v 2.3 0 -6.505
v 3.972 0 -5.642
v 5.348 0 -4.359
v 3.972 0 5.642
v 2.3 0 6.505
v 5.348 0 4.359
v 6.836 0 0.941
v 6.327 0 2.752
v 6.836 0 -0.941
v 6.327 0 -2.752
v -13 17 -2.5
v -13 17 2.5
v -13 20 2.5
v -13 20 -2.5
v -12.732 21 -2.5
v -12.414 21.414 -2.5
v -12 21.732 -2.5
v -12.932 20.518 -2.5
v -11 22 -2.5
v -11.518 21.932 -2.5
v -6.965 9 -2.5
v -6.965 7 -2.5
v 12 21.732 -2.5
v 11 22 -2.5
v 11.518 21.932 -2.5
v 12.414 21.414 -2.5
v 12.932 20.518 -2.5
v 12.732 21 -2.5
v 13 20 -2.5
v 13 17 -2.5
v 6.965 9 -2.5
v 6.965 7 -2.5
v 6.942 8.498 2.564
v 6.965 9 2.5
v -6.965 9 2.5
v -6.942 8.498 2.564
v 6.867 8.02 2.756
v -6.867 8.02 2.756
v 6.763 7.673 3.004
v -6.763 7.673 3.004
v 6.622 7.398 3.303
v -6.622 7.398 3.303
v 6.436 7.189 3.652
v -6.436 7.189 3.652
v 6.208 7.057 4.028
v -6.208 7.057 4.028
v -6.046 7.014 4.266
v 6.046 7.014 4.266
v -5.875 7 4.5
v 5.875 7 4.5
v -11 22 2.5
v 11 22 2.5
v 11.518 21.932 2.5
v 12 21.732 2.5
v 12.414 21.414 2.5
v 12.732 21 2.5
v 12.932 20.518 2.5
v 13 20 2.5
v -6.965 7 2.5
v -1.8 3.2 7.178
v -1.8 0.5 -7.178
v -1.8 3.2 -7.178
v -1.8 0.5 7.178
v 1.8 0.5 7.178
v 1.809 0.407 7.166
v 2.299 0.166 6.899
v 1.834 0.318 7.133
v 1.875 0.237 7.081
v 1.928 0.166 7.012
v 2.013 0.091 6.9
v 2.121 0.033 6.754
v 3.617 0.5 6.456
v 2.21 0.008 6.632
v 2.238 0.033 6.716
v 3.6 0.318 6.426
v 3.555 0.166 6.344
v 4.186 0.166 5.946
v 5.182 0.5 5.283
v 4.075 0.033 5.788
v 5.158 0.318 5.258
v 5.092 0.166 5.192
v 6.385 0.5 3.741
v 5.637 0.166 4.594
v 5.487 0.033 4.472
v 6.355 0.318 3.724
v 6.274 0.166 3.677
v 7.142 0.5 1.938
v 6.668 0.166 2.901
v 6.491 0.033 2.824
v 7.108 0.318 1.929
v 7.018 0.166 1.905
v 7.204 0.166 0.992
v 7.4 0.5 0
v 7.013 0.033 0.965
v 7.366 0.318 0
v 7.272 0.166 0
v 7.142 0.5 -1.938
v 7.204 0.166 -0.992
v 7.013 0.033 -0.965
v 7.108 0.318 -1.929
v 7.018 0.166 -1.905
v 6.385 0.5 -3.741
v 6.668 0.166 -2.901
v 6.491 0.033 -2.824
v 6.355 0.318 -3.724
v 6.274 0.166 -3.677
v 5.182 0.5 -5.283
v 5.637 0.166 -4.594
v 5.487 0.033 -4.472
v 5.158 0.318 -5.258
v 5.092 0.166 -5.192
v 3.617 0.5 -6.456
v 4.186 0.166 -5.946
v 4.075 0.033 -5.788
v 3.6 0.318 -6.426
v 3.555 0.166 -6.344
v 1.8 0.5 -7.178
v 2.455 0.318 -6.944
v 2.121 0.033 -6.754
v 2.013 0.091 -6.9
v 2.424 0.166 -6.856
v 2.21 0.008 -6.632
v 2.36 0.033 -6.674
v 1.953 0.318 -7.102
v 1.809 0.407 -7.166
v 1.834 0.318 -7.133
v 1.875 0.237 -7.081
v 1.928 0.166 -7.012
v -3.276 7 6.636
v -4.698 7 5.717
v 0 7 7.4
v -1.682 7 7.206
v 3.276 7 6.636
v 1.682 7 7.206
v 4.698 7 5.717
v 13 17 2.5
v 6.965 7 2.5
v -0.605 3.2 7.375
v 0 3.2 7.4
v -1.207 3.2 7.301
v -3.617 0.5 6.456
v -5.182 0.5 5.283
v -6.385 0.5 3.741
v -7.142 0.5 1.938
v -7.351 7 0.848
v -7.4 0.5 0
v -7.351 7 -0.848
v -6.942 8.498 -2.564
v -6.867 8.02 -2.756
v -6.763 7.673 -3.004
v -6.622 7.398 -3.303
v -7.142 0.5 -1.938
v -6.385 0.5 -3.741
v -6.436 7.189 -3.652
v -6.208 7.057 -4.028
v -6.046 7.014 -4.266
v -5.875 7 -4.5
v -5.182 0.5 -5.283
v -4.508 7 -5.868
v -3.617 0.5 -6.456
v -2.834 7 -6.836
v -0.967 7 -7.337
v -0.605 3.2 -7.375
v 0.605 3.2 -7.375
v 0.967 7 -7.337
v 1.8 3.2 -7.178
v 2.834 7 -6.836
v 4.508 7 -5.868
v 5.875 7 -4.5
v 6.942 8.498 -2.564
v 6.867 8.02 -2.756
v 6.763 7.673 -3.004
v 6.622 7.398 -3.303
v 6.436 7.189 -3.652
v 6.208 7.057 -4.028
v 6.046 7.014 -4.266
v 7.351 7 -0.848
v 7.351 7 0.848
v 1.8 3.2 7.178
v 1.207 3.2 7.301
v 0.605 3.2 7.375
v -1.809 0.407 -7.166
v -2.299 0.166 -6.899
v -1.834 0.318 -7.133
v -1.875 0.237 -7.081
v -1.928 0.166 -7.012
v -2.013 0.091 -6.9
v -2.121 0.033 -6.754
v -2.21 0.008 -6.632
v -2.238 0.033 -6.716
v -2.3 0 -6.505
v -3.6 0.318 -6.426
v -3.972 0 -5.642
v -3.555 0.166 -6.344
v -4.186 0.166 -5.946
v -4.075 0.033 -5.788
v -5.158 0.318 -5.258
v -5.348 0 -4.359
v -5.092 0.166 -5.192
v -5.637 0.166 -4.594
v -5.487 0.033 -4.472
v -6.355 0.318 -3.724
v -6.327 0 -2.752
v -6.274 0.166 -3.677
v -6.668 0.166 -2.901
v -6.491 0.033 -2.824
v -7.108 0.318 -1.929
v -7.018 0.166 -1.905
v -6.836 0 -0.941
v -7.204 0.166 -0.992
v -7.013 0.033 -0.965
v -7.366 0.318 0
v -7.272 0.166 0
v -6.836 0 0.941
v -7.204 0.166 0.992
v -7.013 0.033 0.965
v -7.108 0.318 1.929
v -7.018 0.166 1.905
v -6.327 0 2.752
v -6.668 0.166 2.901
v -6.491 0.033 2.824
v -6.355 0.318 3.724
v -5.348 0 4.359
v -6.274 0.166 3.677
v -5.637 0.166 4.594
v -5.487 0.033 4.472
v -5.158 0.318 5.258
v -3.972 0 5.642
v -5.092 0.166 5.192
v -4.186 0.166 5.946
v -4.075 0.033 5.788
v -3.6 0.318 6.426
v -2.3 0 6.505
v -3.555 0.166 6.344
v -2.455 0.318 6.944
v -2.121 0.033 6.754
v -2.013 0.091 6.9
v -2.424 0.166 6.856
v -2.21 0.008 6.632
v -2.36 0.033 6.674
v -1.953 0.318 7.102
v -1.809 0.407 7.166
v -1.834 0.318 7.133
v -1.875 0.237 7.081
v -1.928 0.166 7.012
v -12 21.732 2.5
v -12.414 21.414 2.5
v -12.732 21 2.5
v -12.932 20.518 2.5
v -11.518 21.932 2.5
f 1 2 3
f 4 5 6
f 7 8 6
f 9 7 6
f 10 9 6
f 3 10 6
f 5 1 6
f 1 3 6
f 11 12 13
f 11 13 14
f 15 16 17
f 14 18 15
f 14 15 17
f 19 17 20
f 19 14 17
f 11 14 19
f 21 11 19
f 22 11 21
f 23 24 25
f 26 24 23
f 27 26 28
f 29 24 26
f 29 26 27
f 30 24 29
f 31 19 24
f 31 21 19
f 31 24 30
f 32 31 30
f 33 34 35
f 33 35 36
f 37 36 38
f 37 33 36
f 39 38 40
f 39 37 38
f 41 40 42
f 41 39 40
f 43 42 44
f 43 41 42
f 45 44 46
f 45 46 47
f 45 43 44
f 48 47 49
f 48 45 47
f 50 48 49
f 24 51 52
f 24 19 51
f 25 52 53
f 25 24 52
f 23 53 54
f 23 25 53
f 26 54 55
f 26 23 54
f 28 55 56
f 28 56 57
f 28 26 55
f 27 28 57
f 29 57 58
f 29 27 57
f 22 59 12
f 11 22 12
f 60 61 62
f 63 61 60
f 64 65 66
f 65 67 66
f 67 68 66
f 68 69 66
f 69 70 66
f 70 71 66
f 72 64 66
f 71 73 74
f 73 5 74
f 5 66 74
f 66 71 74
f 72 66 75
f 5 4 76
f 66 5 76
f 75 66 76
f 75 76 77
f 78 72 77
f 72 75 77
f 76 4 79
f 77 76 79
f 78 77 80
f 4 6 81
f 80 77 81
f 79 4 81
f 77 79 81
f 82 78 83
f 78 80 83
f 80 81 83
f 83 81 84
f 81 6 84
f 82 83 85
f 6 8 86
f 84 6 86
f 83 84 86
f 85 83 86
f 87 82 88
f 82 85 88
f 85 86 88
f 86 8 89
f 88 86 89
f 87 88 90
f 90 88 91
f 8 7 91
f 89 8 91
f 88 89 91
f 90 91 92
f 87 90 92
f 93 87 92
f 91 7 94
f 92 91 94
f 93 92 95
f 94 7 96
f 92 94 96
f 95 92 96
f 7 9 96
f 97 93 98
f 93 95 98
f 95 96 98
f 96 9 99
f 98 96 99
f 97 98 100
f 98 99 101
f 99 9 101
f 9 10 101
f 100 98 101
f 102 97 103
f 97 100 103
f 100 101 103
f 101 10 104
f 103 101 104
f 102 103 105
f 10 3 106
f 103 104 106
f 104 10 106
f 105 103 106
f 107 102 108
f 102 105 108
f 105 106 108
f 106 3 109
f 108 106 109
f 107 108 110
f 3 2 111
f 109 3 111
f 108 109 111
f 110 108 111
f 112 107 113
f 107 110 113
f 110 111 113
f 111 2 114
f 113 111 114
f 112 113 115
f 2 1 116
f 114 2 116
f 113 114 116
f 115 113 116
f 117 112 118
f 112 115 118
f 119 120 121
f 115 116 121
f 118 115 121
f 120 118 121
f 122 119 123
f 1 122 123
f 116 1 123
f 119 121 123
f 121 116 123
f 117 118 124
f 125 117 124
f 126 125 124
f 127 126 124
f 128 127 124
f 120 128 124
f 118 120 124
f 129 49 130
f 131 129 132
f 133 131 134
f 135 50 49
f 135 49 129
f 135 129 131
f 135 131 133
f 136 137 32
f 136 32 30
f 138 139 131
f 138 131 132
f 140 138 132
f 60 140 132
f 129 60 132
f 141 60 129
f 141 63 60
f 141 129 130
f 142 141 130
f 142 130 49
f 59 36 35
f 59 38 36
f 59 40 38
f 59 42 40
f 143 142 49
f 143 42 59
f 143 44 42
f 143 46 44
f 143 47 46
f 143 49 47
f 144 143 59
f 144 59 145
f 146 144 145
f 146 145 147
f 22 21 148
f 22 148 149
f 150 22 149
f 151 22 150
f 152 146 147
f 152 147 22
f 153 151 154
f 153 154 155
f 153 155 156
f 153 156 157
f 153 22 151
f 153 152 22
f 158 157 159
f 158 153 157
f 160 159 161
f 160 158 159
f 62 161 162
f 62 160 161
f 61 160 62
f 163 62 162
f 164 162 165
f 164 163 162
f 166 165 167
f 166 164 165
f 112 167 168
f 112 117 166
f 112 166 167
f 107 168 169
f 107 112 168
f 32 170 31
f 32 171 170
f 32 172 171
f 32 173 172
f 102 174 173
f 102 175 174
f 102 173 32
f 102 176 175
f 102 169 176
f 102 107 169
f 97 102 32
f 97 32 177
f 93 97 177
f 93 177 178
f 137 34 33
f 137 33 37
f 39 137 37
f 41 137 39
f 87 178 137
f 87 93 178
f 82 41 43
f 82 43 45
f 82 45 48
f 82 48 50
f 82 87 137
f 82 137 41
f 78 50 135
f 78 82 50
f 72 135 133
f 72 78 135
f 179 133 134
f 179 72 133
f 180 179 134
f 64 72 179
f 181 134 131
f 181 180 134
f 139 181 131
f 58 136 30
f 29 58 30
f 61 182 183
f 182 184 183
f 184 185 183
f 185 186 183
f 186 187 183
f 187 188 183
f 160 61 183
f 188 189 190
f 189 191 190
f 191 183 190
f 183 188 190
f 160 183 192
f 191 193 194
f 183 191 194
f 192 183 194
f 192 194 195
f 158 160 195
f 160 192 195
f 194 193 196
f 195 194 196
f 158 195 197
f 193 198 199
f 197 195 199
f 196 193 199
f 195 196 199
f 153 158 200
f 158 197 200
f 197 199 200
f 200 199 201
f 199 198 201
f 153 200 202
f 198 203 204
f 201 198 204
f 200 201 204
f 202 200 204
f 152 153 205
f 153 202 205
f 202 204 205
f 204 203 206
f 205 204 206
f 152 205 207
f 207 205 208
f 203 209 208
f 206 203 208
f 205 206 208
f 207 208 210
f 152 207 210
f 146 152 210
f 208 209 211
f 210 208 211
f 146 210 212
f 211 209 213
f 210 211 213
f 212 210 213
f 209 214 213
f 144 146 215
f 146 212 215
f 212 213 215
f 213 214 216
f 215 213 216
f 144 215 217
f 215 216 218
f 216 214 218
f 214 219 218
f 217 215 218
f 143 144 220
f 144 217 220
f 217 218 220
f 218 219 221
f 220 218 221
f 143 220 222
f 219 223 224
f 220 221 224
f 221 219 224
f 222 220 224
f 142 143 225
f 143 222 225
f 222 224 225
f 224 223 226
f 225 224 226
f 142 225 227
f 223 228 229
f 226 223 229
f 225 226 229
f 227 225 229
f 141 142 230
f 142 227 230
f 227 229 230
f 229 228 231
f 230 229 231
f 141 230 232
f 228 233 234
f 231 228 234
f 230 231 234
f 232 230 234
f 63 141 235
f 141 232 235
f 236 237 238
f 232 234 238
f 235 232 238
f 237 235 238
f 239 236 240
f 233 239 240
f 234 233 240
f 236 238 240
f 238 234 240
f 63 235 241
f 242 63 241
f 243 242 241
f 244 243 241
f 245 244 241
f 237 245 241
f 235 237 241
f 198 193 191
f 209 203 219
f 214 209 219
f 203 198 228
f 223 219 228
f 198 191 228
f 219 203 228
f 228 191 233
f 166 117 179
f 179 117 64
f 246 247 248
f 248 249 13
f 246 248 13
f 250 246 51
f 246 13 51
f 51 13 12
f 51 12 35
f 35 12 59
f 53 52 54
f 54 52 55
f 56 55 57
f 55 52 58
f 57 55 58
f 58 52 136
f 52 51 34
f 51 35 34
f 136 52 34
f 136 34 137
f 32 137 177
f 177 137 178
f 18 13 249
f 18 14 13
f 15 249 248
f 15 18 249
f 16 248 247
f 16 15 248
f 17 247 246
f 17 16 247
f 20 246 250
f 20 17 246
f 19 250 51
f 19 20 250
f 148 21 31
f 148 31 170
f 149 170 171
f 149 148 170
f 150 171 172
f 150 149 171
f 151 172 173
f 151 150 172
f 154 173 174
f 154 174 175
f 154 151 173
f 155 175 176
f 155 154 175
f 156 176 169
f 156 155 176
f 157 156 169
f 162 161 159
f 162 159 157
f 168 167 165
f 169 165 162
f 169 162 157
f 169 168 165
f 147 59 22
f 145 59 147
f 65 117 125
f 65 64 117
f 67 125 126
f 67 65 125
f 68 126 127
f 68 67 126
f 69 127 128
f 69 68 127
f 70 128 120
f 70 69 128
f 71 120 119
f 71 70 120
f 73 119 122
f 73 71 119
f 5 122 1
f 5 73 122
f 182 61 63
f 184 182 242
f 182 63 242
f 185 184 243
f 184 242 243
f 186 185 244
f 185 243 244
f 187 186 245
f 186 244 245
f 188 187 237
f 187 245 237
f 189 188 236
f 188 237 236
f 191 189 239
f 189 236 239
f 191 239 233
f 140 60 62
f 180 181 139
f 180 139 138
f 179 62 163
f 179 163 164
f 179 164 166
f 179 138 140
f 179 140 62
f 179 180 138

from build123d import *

# Parameters (mm, degrees)
SKETCH1_R           = 7.4
BOSS_EXTRUDE1_DEPTH = 7
SKETCH2_W           = 3.6
SKETCH2_H           = 16.327847923
CUT_EXTRUDE1_DEPTH  = 3.2
FILLET1_R           = 0.5
SKETCH3_W           = 26
SKETCH3_H           = 5
BOSS_EXTRUDE2_DEPTH = 15
CUT_EXTRUDE2_DEPTH  = 28.404561664
FILLET2_R           = 2
FILLET3_R           = 2


with BuildPart() as part:
    # Sketch1 → Boss-Extrude1 (new body)
    with BuildSketch(Plane(origin=(0, 0, 0), x_dir=(1, 0, 0), z_dir=(0, 1, 0))):
        with Locations(Location((0, 0, 0), (0, 0, 270))):
            Circle(SKETCH1_R)
    extrude(amount=BOSS_EXTRUDE1_DEPTH)

    # Sketch2 → Cut-Extrude1 (cut)
    with BuildSketch(Plane.XZ):
        with Locations((0, -0.126477582)):
            Rectangle(SKETCH2_W, SKETCH2_H)
    extrude(amount=-CUT_EXTRUDE1_DEPTH, mode=Mode.SUBTRACT)

    # Fillet1
    fillet1_edges = [part.edges().sort_by_distance(p)[0] for p in [
        (7.4, 0, 0),
        (-7.4, 0, 0),
        (1.8, 0, 0),
        (-1.8, 0, 0),
    ]]
    fillet(fillet1_edges, radius=FILLET1_R)

    # Sketch3 → Boss-Extrude2 (add)
    with BuildSketch(Plane(origin=(0, 7, 0), x_dir=(1, 0, 0), z_dir=(0, 1, 0))):
        Rectangle(SKETCH3_W, SKETCH3_H)
    extrude(amount=BOSS_EXTRUDE2_DEPTH)

    # Sketch4 → Cut-Extrude2 (cut, through all)
    with BuildSketch(Plane.XY.offset(2.5)):
        Polygon((-6.96491206, 7), (-13, 17), (-13, 7), align=None)
        Polygon((6.96491206, 7), (13, 17), (13, 7), align=None)
    extrude(amount=-CUT_EXTRUDE2_DEPTH, mode=Mode.SUBTRACT)

    # Fillet2
    fillet2_edges = [part.edges().sort_by_distance(p)[0] for p in [
        (-13, 22, 0),
        (13, 22, 0),
    ]]
    fillet(fillet2_edges, radius=FILLET2_R)

    # Fillet3
    # the kernel refuses this fillet: 2 mm, written as the material it adds along each edge
    with BuildSketch(Plane(origin=(11.96491206, 7, 2.5), x_dir=(0, 1, 0), z_dir=(-1, 0, 0))) as fillet3_piece_1_section:
        with BuildLine():
            CenterArc((FILLET3_R, -FILLET3_R), FILLET3_R, 90, 90)
            Line((0, -FILLET3_R), (0, 0))
            Line((0, 0), (FILLET3_R, 0))
        make_face()
    fillet3_piece_1 = extrude(amount=23.929824119, mode=Mode.PRIVATE)
    fillet3_piece_1 = fillet3_piece_1 & Plane(origin=(0, 7.46029714, 0), x_dir=(0, 0, 1), z_dir=(0, -1, 0)) * Cylinder(7.4, 56, mode=Mode.PRIVATE)
    add(fillet3_piece_1)
    with BuildSketch(Plane(origin=(-11.96491206, 7, -2.5), x_dir=(0, 1, 0), z_dir=(1, 0, 0))) as fillet3_piece_2_section:
        with BuildLine():
            CenterArc((FILLET3_R, -FILLET3_R), FILLET3_R, 90, 90)
            Line((0, -FILLET3_R), (0, 0))
            Line((0, 0), (FILLET3_R, 0))
        make_face()
    fillet3_piece_2 = extrude(amount=23.929824119, mode=Mode.PRIVATE)
    fillet3_piece_2 = fillet3_piece_2 & Plane(origin=(0, 7.460297172, 0), x_dir=(0, 0, 1), z_dir=(0, -1, 0)) * Cylinder(7.4, 56, mode=Mode.PRIVATE)
    add(fillet3_piece_2)


solid = part.part
